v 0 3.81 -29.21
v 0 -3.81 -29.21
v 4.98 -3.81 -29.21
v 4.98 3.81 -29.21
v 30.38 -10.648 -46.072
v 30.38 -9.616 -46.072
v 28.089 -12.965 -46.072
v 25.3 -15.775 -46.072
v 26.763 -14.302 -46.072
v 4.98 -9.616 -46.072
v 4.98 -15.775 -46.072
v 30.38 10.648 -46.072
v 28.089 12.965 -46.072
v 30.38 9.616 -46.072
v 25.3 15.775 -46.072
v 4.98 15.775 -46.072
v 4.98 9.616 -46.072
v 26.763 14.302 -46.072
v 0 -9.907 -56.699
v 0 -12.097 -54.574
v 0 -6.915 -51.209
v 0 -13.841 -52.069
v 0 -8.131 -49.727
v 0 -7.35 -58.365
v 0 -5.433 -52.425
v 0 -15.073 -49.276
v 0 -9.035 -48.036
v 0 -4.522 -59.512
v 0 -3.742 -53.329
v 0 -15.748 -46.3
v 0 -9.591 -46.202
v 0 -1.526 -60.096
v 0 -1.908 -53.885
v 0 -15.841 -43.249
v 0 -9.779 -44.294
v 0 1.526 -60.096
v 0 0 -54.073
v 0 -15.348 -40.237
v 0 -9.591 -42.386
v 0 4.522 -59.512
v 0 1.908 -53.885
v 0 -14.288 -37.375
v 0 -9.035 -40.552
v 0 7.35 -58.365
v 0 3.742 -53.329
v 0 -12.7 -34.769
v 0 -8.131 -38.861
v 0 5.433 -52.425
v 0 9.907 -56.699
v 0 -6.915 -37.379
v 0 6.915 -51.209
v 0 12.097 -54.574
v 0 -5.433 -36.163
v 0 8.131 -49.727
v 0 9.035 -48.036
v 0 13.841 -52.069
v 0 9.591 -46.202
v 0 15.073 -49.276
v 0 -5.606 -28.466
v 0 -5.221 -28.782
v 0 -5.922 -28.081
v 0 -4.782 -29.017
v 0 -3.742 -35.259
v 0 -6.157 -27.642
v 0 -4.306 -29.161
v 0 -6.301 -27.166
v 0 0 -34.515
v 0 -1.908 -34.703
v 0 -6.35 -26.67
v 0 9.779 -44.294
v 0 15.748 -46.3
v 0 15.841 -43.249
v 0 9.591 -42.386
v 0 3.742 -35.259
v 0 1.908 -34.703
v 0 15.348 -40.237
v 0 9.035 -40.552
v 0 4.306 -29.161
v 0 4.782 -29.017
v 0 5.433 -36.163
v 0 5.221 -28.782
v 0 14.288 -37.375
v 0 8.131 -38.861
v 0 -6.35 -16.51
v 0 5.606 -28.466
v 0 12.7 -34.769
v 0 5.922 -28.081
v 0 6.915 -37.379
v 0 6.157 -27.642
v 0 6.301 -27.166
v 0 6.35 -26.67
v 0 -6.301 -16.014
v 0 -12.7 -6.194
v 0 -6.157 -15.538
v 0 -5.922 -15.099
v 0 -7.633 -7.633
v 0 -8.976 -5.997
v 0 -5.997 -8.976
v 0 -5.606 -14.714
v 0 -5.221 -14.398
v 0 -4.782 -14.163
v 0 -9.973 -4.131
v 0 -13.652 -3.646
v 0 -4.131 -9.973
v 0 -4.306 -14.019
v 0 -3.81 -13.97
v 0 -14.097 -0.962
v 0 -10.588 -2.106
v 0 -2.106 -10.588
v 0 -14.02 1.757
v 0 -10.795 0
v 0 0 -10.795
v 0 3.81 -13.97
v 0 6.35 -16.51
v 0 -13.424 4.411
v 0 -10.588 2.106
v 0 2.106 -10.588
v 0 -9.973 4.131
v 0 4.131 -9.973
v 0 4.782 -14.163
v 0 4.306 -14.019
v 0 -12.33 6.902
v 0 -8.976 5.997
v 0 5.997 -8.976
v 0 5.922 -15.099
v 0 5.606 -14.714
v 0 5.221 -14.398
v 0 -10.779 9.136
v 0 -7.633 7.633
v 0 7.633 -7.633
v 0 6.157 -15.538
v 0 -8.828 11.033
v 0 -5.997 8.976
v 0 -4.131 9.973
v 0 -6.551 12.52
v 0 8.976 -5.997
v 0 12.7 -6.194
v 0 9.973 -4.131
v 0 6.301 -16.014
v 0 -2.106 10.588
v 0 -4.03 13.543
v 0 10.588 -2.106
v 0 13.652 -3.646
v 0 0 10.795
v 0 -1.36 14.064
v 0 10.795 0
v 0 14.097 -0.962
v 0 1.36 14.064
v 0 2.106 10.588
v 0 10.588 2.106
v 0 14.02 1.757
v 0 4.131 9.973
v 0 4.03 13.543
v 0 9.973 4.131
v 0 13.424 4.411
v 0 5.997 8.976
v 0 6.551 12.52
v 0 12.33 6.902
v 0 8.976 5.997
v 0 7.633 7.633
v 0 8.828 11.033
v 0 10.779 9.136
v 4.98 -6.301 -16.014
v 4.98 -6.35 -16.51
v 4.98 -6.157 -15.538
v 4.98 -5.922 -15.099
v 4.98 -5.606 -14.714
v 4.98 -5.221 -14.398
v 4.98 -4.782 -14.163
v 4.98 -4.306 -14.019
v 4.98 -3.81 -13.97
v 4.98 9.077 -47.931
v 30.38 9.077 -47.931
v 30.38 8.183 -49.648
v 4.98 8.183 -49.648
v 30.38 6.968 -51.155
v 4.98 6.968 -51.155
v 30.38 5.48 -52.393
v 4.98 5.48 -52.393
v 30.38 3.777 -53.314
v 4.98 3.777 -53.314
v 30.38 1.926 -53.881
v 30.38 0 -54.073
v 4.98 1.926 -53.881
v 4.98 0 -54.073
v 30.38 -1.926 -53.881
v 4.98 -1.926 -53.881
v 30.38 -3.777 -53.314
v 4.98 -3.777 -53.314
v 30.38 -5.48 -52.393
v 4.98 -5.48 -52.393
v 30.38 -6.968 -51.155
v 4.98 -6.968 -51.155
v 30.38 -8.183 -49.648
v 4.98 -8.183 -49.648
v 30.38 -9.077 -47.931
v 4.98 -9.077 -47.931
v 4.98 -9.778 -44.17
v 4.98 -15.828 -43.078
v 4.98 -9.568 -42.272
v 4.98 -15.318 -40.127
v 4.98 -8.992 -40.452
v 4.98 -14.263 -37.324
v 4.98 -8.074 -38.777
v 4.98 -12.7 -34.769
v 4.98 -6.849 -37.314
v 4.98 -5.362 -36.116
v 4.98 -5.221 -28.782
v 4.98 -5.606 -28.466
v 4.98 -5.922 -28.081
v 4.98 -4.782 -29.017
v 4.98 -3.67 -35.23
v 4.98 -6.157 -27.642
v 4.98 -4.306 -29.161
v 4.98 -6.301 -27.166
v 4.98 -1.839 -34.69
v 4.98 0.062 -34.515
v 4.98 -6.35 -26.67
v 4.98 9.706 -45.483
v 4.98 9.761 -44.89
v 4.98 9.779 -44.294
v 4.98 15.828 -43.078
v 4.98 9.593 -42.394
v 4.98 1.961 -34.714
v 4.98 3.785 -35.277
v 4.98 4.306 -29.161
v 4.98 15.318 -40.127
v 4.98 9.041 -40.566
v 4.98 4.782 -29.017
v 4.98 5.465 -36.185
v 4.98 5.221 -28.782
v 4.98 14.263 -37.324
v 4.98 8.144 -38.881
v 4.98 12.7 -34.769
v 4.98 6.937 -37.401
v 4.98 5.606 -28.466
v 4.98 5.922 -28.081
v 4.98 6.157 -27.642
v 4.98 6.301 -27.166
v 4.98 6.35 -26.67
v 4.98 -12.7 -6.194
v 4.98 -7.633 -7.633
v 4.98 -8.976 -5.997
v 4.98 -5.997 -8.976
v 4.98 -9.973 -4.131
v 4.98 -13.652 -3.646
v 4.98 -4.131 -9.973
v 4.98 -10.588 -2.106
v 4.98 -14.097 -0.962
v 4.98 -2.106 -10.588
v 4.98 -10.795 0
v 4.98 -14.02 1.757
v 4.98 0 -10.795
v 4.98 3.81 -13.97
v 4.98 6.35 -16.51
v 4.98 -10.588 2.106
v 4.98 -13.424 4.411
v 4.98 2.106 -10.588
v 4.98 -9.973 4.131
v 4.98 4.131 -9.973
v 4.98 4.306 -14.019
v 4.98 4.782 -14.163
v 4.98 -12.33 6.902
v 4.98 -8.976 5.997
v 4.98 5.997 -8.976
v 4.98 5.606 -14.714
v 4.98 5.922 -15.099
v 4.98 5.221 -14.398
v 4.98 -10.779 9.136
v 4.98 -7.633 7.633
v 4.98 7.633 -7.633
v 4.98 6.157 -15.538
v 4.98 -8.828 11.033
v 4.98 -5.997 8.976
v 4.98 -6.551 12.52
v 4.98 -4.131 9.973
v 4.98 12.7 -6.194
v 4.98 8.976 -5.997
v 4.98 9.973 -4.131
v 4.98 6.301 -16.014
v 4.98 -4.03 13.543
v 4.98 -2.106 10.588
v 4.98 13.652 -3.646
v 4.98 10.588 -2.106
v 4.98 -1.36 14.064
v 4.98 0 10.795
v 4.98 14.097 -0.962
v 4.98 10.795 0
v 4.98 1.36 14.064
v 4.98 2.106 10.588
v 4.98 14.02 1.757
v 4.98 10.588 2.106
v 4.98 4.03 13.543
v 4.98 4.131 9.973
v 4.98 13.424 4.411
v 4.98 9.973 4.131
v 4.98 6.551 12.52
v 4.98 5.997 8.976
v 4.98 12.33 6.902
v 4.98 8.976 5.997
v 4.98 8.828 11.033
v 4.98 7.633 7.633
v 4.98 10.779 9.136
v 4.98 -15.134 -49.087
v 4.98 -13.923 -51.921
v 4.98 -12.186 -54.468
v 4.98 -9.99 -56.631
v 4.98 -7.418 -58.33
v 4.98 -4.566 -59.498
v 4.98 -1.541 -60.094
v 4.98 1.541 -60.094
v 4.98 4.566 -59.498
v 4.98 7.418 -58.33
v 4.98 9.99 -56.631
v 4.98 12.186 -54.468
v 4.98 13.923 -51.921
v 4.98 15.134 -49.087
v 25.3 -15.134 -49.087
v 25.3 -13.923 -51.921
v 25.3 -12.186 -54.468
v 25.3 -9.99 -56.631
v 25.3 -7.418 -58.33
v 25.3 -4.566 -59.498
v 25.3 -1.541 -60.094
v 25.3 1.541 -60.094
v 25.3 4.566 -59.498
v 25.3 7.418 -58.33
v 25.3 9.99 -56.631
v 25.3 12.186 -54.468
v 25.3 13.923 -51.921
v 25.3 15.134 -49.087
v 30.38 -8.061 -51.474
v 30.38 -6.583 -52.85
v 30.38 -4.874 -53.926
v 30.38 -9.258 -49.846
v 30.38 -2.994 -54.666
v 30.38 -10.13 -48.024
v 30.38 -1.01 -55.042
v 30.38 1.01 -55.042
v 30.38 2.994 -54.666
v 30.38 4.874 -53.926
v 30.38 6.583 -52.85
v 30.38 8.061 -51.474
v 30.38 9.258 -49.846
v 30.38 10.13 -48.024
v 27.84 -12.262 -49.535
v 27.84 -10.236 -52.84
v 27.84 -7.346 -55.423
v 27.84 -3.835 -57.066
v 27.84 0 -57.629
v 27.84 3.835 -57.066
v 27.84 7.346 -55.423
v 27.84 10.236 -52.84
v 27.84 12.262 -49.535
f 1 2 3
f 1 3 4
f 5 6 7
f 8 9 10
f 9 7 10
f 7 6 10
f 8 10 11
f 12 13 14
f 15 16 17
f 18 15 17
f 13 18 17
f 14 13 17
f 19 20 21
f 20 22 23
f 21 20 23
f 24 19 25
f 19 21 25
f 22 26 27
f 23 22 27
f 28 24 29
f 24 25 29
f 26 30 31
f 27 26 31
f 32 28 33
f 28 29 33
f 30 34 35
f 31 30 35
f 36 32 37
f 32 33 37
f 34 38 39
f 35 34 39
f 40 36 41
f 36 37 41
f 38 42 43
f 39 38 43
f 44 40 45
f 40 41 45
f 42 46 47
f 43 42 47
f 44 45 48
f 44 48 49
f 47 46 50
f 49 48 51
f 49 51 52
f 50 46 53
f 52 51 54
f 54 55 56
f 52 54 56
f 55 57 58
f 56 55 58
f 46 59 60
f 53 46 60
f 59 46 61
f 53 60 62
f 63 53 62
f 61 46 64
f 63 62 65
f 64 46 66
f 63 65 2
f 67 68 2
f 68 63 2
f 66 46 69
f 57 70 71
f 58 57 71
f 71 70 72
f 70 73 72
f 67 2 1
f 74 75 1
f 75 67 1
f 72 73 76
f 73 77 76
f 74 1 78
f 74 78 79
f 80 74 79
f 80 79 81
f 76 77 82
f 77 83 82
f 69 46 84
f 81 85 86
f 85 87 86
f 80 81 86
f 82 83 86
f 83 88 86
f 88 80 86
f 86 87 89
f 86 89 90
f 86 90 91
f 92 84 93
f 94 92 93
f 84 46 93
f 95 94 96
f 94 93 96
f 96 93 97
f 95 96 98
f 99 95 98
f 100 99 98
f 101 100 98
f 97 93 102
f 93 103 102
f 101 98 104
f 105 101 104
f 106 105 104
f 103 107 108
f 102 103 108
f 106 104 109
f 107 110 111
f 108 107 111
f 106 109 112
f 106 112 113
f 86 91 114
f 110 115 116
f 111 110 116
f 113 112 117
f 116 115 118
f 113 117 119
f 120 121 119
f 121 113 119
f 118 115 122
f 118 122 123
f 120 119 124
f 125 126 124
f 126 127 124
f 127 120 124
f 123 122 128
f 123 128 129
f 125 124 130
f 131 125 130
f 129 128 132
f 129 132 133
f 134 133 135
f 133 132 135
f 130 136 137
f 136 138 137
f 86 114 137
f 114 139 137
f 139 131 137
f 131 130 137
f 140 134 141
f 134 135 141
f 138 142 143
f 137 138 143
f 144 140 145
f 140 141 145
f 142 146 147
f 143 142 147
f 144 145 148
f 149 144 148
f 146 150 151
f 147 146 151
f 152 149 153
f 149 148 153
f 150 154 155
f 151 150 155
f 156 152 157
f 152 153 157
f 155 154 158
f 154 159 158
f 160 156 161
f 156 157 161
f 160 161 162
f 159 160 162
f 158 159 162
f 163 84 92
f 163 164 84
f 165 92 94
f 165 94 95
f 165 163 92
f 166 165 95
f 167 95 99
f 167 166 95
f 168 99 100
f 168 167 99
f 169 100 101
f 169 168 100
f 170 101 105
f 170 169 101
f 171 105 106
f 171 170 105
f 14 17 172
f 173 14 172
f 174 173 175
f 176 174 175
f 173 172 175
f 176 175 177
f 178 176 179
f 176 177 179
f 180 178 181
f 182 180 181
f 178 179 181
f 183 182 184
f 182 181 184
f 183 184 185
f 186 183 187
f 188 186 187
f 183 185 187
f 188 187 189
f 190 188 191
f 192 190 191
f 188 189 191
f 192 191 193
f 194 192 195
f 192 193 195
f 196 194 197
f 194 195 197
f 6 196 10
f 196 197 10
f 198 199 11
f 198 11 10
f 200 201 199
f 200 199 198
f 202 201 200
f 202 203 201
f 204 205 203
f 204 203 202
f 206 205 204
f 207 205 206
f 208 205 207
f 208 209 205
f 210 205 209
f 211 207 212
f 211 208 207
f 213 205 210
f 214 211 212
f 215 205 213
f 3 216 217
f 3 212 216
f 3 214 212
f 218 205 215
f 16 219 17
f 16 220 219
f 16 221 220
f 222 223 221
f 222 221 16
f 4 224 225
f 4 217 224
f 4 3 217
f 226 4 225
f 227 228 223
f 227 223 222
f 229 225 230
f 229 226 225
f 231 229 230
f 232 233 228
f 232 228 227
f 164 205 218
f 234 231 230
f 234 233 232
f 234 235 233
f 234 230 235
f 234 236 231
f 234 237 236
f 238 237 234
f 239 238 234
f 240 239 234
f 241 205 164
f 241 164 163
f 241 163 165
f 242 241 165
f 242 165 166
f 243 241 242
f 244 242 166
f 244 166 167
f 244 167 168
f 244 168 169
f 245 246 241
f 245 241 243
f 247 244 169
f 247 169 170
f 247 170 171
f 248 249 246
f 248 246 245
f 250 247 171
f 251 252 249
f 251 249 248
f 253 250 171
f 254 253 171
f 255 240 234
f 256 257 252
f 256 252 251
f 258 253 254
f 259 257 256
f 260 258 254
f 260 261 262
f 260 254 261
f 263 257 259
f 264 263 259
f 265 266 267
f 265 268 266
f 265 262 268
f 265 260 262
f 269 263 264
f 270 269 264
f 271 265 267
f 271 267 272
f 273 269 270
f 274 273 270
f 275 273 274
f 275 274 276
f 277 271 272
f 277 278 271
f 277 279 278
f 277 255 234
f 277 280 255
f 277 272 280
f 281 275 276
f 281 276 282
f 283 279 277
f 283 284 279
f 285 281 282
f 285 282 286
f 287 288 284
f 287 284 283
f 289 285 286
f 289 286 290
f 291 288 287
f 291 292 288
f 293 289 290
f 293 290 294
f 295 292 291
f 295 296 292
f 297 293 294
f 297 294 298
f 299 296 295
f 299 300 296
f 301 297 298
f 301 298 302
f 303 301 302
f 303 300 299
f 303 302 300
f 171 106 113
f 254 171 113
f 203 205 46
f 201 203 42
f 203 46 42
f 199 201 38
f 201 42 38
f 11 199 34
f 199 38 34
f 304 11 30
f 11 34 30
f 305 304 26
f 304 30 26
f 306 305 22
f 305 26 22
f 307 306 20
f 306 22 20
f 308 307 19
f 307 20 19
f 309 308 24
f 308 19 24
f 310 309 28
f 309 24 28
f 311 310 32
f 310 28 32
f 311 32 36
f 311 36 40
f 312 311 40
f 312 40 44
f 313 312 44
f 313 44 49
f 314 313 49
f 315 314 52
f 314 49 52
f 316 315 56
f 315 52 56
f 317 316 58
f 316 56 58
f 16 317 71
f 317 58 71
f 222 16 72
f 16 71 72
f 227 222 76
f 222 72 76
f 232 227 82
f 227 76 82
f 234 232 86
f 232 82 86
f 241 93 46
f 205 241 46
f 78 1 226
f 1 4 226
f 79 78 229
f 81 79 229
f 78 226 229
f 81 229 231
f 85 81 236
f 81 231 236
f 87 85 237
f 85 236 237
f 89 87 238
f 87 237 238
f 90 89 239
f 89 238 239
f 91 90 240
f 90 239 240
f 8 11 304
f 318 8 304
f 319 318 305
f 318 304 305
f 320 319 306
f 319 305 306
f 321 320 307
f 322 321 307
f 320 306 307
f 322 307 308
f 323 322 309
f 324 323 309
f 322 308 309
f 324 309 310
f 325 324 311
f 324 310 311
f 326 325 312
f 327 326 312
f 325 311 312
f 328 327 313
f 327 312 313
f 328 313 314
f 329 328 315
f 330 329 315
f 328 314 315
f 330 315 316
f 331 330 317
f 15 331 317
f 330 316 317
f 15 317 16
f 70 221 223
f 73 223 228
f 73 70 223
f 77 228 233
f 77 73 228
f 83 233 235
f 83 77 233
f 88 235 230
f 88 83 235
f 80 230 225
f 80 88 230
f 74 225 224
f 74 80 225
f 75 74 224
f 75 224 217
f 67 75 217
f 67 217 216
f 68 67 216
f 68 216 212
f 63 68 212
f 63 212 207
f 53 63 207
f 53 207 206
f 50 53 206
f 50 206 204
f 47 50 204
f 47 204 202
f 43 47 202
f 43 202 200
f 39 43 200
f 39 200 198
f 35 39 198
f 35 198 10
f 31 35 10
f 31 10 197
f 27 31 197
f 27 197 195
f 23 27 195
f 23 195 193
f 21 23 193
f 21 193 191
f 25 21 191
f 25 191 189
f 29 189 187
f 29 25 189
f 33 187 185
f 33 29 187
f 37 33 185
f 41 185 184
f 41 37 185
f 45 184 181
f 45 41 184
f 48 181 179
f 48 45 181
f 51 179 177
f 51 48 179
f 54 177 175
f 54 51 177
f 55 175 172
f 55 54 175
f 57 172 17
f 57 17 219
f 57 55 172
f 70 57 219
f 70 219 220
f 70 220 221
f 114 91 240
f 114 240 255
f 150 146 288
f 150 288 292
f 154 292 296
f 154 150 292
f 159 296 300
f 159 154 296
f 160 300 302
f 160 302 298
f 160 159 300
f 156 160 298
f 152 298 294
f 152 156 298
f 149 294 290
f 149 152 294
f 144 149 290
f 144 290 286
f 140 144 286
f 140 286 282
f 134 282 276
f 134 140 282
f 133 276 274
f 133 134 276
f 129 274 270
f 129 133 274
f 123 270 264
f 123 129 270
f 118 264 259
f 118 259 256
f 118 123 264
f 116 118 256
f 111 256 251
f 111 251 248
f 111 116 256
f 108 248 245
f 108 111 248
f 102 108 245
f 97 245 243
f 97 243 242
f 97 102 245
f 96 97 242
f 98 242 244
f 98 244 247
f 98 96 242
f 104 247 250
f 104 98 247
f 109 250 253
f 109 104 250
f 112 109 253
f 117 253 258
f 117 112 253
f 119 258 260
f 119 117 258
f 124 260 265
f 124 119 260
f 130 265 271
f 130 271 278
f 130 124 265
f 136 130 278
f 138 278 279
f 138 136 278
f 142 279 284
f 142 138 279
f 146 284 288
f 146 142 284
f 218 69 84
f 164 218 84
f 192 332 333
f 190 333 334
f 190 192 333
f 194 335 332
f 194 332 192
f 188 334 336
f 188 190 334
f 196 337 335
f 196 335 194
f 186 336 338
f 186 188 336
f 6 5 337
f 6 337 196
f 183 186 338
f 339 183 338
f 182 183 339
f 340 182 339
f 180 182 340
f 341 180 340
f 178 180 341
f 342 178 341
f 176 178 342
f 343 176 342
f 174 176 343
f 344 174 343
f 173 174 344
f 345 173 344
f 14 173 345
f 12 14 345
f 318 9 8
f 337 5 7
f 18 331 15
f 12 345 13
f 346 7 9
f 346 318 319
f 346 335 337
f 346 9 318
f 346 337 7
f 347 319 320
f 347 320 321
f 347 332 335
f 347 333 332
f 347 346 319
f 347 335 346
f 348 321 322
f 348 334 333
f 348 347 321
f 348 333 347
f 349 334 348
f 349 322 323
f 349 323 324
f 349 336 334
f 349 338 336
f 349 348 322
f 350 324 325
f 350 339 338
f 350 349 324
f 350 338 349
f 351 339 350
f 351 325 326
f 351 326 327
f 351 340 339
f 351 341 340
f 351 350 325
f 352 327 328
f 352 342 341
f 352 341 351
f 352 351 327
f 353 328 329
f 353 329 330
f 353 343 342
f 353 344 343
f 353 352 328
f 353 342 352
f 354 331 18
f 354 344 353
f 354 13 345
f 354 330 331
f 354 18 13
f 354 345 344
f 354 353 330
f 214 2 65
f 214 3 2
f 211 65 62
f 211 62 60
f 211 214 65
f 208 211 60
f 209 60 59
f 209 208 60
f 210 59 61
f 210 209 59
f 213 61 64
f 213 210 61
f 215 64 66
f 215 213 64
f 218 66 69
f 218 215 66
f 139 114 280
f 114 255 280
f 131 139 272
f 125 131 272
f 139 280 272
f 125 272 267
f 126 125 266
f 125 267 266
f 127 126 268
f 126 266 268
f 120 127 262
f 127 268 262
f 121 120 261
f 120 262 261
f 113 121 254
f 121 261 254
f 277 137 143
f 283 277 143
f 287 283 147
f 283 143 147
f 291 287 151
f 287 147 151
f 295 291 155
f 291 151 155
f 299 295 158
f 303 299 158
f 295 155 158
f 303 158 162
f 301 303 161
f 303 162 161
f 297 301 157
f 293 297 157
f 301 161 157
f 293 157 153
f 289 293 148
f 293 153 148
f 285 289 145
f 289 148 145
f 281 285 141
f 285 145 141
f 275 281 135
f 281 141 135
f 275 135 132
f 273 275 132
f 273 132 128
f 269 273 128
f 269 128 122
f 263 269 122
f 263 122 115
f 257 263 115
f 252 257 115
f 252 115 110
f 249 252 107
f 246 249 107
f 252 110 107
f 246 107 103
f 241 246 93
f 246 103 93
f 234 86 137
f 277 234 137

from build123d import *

# Parameters (mm, degrees)
F0_R     = 9.779
F0_W     = 12.7
F0_H     = 15.24
F0_R_2   = 10.795
F1_DEPTH = 4.9800002
F3_DEPTH = 25.4
F4_SIZE  = 5.08
F5_R     = 2.54


# Not quite as in the source:
# - a feature names something its author has since deleted; it is built from what else it names


with BuildPart() as f1:
    # F0 (on Right) → F1 (new body)
    with BuildSketch(Plane.YZ):
        with BuildLine():
            Line((12.7, -34.7691013034), (12.7, -6.1941013034))
            ThreePointArc((12.7, -6.1941013034), (0, 14.12999968), (-12.7, -6.1941013034))
            Line((-12.7, -6.1941013034), (-12.7, -34.7691013034))
            ThreePointArc((-12.7, -34.7691013034), (0, -60.1691013034), (12.7, -34.7691013034))
        make_face()
        with Locations((0, -44.2941013034)):
            Circle(F0_R, mode=Mode.SUBTRACT)
        with Locations((0, -21.59)):
            Rectangle(F0_W, F0_H, mode=Mode.SUBTRACT)
        Circle(F0_R_2, mode=Mode.SUBTRACT)
    extrude(amount=F1_DEPTH)

    # F2 (on face) → F3 (join)
    with BuildSketch(Plane.YZ.offset(4.9800002)):
        with BuildLine():
            ThreePointArc((9.6160052517, -46.0721013034), (0, -54.0731013034), (-9.6160052517, -46.0721013034))
            Line((-9.6160052517, -46.0721013034), (-15.7751177809, -46.0721013034))
            ThreePointArc((-15.7751177809, -46.0721013034), (0, -60.1691013034), (15.7751177809, -46.0721013034))
            Line((15.7751177809, -46.0721013034), (9.6160052517, -46.0721013034))
        make_face()
    extrude(amount=F3_DEPTH)

    # F4
    f4_edges = [f1.edges().sort_by_distance(p)[0] for p in [
        (30.38, 0, -60.169101),
    ]]
    chamfer(f4_edges, length=F4_SIZE)

    # F5
    f5_edges = [f1.edges().sort_by_distance(p)[0] for p in [
        (2.49, 6.35, -13.97),
        (2.49, -6.35, -13.97),
        (2.49, 6.35, -29.21),
        (2.49, -6.35, -29.21),
    ]]
    fillet(f5_edges, radius=F5_R)


solid = f1.part
